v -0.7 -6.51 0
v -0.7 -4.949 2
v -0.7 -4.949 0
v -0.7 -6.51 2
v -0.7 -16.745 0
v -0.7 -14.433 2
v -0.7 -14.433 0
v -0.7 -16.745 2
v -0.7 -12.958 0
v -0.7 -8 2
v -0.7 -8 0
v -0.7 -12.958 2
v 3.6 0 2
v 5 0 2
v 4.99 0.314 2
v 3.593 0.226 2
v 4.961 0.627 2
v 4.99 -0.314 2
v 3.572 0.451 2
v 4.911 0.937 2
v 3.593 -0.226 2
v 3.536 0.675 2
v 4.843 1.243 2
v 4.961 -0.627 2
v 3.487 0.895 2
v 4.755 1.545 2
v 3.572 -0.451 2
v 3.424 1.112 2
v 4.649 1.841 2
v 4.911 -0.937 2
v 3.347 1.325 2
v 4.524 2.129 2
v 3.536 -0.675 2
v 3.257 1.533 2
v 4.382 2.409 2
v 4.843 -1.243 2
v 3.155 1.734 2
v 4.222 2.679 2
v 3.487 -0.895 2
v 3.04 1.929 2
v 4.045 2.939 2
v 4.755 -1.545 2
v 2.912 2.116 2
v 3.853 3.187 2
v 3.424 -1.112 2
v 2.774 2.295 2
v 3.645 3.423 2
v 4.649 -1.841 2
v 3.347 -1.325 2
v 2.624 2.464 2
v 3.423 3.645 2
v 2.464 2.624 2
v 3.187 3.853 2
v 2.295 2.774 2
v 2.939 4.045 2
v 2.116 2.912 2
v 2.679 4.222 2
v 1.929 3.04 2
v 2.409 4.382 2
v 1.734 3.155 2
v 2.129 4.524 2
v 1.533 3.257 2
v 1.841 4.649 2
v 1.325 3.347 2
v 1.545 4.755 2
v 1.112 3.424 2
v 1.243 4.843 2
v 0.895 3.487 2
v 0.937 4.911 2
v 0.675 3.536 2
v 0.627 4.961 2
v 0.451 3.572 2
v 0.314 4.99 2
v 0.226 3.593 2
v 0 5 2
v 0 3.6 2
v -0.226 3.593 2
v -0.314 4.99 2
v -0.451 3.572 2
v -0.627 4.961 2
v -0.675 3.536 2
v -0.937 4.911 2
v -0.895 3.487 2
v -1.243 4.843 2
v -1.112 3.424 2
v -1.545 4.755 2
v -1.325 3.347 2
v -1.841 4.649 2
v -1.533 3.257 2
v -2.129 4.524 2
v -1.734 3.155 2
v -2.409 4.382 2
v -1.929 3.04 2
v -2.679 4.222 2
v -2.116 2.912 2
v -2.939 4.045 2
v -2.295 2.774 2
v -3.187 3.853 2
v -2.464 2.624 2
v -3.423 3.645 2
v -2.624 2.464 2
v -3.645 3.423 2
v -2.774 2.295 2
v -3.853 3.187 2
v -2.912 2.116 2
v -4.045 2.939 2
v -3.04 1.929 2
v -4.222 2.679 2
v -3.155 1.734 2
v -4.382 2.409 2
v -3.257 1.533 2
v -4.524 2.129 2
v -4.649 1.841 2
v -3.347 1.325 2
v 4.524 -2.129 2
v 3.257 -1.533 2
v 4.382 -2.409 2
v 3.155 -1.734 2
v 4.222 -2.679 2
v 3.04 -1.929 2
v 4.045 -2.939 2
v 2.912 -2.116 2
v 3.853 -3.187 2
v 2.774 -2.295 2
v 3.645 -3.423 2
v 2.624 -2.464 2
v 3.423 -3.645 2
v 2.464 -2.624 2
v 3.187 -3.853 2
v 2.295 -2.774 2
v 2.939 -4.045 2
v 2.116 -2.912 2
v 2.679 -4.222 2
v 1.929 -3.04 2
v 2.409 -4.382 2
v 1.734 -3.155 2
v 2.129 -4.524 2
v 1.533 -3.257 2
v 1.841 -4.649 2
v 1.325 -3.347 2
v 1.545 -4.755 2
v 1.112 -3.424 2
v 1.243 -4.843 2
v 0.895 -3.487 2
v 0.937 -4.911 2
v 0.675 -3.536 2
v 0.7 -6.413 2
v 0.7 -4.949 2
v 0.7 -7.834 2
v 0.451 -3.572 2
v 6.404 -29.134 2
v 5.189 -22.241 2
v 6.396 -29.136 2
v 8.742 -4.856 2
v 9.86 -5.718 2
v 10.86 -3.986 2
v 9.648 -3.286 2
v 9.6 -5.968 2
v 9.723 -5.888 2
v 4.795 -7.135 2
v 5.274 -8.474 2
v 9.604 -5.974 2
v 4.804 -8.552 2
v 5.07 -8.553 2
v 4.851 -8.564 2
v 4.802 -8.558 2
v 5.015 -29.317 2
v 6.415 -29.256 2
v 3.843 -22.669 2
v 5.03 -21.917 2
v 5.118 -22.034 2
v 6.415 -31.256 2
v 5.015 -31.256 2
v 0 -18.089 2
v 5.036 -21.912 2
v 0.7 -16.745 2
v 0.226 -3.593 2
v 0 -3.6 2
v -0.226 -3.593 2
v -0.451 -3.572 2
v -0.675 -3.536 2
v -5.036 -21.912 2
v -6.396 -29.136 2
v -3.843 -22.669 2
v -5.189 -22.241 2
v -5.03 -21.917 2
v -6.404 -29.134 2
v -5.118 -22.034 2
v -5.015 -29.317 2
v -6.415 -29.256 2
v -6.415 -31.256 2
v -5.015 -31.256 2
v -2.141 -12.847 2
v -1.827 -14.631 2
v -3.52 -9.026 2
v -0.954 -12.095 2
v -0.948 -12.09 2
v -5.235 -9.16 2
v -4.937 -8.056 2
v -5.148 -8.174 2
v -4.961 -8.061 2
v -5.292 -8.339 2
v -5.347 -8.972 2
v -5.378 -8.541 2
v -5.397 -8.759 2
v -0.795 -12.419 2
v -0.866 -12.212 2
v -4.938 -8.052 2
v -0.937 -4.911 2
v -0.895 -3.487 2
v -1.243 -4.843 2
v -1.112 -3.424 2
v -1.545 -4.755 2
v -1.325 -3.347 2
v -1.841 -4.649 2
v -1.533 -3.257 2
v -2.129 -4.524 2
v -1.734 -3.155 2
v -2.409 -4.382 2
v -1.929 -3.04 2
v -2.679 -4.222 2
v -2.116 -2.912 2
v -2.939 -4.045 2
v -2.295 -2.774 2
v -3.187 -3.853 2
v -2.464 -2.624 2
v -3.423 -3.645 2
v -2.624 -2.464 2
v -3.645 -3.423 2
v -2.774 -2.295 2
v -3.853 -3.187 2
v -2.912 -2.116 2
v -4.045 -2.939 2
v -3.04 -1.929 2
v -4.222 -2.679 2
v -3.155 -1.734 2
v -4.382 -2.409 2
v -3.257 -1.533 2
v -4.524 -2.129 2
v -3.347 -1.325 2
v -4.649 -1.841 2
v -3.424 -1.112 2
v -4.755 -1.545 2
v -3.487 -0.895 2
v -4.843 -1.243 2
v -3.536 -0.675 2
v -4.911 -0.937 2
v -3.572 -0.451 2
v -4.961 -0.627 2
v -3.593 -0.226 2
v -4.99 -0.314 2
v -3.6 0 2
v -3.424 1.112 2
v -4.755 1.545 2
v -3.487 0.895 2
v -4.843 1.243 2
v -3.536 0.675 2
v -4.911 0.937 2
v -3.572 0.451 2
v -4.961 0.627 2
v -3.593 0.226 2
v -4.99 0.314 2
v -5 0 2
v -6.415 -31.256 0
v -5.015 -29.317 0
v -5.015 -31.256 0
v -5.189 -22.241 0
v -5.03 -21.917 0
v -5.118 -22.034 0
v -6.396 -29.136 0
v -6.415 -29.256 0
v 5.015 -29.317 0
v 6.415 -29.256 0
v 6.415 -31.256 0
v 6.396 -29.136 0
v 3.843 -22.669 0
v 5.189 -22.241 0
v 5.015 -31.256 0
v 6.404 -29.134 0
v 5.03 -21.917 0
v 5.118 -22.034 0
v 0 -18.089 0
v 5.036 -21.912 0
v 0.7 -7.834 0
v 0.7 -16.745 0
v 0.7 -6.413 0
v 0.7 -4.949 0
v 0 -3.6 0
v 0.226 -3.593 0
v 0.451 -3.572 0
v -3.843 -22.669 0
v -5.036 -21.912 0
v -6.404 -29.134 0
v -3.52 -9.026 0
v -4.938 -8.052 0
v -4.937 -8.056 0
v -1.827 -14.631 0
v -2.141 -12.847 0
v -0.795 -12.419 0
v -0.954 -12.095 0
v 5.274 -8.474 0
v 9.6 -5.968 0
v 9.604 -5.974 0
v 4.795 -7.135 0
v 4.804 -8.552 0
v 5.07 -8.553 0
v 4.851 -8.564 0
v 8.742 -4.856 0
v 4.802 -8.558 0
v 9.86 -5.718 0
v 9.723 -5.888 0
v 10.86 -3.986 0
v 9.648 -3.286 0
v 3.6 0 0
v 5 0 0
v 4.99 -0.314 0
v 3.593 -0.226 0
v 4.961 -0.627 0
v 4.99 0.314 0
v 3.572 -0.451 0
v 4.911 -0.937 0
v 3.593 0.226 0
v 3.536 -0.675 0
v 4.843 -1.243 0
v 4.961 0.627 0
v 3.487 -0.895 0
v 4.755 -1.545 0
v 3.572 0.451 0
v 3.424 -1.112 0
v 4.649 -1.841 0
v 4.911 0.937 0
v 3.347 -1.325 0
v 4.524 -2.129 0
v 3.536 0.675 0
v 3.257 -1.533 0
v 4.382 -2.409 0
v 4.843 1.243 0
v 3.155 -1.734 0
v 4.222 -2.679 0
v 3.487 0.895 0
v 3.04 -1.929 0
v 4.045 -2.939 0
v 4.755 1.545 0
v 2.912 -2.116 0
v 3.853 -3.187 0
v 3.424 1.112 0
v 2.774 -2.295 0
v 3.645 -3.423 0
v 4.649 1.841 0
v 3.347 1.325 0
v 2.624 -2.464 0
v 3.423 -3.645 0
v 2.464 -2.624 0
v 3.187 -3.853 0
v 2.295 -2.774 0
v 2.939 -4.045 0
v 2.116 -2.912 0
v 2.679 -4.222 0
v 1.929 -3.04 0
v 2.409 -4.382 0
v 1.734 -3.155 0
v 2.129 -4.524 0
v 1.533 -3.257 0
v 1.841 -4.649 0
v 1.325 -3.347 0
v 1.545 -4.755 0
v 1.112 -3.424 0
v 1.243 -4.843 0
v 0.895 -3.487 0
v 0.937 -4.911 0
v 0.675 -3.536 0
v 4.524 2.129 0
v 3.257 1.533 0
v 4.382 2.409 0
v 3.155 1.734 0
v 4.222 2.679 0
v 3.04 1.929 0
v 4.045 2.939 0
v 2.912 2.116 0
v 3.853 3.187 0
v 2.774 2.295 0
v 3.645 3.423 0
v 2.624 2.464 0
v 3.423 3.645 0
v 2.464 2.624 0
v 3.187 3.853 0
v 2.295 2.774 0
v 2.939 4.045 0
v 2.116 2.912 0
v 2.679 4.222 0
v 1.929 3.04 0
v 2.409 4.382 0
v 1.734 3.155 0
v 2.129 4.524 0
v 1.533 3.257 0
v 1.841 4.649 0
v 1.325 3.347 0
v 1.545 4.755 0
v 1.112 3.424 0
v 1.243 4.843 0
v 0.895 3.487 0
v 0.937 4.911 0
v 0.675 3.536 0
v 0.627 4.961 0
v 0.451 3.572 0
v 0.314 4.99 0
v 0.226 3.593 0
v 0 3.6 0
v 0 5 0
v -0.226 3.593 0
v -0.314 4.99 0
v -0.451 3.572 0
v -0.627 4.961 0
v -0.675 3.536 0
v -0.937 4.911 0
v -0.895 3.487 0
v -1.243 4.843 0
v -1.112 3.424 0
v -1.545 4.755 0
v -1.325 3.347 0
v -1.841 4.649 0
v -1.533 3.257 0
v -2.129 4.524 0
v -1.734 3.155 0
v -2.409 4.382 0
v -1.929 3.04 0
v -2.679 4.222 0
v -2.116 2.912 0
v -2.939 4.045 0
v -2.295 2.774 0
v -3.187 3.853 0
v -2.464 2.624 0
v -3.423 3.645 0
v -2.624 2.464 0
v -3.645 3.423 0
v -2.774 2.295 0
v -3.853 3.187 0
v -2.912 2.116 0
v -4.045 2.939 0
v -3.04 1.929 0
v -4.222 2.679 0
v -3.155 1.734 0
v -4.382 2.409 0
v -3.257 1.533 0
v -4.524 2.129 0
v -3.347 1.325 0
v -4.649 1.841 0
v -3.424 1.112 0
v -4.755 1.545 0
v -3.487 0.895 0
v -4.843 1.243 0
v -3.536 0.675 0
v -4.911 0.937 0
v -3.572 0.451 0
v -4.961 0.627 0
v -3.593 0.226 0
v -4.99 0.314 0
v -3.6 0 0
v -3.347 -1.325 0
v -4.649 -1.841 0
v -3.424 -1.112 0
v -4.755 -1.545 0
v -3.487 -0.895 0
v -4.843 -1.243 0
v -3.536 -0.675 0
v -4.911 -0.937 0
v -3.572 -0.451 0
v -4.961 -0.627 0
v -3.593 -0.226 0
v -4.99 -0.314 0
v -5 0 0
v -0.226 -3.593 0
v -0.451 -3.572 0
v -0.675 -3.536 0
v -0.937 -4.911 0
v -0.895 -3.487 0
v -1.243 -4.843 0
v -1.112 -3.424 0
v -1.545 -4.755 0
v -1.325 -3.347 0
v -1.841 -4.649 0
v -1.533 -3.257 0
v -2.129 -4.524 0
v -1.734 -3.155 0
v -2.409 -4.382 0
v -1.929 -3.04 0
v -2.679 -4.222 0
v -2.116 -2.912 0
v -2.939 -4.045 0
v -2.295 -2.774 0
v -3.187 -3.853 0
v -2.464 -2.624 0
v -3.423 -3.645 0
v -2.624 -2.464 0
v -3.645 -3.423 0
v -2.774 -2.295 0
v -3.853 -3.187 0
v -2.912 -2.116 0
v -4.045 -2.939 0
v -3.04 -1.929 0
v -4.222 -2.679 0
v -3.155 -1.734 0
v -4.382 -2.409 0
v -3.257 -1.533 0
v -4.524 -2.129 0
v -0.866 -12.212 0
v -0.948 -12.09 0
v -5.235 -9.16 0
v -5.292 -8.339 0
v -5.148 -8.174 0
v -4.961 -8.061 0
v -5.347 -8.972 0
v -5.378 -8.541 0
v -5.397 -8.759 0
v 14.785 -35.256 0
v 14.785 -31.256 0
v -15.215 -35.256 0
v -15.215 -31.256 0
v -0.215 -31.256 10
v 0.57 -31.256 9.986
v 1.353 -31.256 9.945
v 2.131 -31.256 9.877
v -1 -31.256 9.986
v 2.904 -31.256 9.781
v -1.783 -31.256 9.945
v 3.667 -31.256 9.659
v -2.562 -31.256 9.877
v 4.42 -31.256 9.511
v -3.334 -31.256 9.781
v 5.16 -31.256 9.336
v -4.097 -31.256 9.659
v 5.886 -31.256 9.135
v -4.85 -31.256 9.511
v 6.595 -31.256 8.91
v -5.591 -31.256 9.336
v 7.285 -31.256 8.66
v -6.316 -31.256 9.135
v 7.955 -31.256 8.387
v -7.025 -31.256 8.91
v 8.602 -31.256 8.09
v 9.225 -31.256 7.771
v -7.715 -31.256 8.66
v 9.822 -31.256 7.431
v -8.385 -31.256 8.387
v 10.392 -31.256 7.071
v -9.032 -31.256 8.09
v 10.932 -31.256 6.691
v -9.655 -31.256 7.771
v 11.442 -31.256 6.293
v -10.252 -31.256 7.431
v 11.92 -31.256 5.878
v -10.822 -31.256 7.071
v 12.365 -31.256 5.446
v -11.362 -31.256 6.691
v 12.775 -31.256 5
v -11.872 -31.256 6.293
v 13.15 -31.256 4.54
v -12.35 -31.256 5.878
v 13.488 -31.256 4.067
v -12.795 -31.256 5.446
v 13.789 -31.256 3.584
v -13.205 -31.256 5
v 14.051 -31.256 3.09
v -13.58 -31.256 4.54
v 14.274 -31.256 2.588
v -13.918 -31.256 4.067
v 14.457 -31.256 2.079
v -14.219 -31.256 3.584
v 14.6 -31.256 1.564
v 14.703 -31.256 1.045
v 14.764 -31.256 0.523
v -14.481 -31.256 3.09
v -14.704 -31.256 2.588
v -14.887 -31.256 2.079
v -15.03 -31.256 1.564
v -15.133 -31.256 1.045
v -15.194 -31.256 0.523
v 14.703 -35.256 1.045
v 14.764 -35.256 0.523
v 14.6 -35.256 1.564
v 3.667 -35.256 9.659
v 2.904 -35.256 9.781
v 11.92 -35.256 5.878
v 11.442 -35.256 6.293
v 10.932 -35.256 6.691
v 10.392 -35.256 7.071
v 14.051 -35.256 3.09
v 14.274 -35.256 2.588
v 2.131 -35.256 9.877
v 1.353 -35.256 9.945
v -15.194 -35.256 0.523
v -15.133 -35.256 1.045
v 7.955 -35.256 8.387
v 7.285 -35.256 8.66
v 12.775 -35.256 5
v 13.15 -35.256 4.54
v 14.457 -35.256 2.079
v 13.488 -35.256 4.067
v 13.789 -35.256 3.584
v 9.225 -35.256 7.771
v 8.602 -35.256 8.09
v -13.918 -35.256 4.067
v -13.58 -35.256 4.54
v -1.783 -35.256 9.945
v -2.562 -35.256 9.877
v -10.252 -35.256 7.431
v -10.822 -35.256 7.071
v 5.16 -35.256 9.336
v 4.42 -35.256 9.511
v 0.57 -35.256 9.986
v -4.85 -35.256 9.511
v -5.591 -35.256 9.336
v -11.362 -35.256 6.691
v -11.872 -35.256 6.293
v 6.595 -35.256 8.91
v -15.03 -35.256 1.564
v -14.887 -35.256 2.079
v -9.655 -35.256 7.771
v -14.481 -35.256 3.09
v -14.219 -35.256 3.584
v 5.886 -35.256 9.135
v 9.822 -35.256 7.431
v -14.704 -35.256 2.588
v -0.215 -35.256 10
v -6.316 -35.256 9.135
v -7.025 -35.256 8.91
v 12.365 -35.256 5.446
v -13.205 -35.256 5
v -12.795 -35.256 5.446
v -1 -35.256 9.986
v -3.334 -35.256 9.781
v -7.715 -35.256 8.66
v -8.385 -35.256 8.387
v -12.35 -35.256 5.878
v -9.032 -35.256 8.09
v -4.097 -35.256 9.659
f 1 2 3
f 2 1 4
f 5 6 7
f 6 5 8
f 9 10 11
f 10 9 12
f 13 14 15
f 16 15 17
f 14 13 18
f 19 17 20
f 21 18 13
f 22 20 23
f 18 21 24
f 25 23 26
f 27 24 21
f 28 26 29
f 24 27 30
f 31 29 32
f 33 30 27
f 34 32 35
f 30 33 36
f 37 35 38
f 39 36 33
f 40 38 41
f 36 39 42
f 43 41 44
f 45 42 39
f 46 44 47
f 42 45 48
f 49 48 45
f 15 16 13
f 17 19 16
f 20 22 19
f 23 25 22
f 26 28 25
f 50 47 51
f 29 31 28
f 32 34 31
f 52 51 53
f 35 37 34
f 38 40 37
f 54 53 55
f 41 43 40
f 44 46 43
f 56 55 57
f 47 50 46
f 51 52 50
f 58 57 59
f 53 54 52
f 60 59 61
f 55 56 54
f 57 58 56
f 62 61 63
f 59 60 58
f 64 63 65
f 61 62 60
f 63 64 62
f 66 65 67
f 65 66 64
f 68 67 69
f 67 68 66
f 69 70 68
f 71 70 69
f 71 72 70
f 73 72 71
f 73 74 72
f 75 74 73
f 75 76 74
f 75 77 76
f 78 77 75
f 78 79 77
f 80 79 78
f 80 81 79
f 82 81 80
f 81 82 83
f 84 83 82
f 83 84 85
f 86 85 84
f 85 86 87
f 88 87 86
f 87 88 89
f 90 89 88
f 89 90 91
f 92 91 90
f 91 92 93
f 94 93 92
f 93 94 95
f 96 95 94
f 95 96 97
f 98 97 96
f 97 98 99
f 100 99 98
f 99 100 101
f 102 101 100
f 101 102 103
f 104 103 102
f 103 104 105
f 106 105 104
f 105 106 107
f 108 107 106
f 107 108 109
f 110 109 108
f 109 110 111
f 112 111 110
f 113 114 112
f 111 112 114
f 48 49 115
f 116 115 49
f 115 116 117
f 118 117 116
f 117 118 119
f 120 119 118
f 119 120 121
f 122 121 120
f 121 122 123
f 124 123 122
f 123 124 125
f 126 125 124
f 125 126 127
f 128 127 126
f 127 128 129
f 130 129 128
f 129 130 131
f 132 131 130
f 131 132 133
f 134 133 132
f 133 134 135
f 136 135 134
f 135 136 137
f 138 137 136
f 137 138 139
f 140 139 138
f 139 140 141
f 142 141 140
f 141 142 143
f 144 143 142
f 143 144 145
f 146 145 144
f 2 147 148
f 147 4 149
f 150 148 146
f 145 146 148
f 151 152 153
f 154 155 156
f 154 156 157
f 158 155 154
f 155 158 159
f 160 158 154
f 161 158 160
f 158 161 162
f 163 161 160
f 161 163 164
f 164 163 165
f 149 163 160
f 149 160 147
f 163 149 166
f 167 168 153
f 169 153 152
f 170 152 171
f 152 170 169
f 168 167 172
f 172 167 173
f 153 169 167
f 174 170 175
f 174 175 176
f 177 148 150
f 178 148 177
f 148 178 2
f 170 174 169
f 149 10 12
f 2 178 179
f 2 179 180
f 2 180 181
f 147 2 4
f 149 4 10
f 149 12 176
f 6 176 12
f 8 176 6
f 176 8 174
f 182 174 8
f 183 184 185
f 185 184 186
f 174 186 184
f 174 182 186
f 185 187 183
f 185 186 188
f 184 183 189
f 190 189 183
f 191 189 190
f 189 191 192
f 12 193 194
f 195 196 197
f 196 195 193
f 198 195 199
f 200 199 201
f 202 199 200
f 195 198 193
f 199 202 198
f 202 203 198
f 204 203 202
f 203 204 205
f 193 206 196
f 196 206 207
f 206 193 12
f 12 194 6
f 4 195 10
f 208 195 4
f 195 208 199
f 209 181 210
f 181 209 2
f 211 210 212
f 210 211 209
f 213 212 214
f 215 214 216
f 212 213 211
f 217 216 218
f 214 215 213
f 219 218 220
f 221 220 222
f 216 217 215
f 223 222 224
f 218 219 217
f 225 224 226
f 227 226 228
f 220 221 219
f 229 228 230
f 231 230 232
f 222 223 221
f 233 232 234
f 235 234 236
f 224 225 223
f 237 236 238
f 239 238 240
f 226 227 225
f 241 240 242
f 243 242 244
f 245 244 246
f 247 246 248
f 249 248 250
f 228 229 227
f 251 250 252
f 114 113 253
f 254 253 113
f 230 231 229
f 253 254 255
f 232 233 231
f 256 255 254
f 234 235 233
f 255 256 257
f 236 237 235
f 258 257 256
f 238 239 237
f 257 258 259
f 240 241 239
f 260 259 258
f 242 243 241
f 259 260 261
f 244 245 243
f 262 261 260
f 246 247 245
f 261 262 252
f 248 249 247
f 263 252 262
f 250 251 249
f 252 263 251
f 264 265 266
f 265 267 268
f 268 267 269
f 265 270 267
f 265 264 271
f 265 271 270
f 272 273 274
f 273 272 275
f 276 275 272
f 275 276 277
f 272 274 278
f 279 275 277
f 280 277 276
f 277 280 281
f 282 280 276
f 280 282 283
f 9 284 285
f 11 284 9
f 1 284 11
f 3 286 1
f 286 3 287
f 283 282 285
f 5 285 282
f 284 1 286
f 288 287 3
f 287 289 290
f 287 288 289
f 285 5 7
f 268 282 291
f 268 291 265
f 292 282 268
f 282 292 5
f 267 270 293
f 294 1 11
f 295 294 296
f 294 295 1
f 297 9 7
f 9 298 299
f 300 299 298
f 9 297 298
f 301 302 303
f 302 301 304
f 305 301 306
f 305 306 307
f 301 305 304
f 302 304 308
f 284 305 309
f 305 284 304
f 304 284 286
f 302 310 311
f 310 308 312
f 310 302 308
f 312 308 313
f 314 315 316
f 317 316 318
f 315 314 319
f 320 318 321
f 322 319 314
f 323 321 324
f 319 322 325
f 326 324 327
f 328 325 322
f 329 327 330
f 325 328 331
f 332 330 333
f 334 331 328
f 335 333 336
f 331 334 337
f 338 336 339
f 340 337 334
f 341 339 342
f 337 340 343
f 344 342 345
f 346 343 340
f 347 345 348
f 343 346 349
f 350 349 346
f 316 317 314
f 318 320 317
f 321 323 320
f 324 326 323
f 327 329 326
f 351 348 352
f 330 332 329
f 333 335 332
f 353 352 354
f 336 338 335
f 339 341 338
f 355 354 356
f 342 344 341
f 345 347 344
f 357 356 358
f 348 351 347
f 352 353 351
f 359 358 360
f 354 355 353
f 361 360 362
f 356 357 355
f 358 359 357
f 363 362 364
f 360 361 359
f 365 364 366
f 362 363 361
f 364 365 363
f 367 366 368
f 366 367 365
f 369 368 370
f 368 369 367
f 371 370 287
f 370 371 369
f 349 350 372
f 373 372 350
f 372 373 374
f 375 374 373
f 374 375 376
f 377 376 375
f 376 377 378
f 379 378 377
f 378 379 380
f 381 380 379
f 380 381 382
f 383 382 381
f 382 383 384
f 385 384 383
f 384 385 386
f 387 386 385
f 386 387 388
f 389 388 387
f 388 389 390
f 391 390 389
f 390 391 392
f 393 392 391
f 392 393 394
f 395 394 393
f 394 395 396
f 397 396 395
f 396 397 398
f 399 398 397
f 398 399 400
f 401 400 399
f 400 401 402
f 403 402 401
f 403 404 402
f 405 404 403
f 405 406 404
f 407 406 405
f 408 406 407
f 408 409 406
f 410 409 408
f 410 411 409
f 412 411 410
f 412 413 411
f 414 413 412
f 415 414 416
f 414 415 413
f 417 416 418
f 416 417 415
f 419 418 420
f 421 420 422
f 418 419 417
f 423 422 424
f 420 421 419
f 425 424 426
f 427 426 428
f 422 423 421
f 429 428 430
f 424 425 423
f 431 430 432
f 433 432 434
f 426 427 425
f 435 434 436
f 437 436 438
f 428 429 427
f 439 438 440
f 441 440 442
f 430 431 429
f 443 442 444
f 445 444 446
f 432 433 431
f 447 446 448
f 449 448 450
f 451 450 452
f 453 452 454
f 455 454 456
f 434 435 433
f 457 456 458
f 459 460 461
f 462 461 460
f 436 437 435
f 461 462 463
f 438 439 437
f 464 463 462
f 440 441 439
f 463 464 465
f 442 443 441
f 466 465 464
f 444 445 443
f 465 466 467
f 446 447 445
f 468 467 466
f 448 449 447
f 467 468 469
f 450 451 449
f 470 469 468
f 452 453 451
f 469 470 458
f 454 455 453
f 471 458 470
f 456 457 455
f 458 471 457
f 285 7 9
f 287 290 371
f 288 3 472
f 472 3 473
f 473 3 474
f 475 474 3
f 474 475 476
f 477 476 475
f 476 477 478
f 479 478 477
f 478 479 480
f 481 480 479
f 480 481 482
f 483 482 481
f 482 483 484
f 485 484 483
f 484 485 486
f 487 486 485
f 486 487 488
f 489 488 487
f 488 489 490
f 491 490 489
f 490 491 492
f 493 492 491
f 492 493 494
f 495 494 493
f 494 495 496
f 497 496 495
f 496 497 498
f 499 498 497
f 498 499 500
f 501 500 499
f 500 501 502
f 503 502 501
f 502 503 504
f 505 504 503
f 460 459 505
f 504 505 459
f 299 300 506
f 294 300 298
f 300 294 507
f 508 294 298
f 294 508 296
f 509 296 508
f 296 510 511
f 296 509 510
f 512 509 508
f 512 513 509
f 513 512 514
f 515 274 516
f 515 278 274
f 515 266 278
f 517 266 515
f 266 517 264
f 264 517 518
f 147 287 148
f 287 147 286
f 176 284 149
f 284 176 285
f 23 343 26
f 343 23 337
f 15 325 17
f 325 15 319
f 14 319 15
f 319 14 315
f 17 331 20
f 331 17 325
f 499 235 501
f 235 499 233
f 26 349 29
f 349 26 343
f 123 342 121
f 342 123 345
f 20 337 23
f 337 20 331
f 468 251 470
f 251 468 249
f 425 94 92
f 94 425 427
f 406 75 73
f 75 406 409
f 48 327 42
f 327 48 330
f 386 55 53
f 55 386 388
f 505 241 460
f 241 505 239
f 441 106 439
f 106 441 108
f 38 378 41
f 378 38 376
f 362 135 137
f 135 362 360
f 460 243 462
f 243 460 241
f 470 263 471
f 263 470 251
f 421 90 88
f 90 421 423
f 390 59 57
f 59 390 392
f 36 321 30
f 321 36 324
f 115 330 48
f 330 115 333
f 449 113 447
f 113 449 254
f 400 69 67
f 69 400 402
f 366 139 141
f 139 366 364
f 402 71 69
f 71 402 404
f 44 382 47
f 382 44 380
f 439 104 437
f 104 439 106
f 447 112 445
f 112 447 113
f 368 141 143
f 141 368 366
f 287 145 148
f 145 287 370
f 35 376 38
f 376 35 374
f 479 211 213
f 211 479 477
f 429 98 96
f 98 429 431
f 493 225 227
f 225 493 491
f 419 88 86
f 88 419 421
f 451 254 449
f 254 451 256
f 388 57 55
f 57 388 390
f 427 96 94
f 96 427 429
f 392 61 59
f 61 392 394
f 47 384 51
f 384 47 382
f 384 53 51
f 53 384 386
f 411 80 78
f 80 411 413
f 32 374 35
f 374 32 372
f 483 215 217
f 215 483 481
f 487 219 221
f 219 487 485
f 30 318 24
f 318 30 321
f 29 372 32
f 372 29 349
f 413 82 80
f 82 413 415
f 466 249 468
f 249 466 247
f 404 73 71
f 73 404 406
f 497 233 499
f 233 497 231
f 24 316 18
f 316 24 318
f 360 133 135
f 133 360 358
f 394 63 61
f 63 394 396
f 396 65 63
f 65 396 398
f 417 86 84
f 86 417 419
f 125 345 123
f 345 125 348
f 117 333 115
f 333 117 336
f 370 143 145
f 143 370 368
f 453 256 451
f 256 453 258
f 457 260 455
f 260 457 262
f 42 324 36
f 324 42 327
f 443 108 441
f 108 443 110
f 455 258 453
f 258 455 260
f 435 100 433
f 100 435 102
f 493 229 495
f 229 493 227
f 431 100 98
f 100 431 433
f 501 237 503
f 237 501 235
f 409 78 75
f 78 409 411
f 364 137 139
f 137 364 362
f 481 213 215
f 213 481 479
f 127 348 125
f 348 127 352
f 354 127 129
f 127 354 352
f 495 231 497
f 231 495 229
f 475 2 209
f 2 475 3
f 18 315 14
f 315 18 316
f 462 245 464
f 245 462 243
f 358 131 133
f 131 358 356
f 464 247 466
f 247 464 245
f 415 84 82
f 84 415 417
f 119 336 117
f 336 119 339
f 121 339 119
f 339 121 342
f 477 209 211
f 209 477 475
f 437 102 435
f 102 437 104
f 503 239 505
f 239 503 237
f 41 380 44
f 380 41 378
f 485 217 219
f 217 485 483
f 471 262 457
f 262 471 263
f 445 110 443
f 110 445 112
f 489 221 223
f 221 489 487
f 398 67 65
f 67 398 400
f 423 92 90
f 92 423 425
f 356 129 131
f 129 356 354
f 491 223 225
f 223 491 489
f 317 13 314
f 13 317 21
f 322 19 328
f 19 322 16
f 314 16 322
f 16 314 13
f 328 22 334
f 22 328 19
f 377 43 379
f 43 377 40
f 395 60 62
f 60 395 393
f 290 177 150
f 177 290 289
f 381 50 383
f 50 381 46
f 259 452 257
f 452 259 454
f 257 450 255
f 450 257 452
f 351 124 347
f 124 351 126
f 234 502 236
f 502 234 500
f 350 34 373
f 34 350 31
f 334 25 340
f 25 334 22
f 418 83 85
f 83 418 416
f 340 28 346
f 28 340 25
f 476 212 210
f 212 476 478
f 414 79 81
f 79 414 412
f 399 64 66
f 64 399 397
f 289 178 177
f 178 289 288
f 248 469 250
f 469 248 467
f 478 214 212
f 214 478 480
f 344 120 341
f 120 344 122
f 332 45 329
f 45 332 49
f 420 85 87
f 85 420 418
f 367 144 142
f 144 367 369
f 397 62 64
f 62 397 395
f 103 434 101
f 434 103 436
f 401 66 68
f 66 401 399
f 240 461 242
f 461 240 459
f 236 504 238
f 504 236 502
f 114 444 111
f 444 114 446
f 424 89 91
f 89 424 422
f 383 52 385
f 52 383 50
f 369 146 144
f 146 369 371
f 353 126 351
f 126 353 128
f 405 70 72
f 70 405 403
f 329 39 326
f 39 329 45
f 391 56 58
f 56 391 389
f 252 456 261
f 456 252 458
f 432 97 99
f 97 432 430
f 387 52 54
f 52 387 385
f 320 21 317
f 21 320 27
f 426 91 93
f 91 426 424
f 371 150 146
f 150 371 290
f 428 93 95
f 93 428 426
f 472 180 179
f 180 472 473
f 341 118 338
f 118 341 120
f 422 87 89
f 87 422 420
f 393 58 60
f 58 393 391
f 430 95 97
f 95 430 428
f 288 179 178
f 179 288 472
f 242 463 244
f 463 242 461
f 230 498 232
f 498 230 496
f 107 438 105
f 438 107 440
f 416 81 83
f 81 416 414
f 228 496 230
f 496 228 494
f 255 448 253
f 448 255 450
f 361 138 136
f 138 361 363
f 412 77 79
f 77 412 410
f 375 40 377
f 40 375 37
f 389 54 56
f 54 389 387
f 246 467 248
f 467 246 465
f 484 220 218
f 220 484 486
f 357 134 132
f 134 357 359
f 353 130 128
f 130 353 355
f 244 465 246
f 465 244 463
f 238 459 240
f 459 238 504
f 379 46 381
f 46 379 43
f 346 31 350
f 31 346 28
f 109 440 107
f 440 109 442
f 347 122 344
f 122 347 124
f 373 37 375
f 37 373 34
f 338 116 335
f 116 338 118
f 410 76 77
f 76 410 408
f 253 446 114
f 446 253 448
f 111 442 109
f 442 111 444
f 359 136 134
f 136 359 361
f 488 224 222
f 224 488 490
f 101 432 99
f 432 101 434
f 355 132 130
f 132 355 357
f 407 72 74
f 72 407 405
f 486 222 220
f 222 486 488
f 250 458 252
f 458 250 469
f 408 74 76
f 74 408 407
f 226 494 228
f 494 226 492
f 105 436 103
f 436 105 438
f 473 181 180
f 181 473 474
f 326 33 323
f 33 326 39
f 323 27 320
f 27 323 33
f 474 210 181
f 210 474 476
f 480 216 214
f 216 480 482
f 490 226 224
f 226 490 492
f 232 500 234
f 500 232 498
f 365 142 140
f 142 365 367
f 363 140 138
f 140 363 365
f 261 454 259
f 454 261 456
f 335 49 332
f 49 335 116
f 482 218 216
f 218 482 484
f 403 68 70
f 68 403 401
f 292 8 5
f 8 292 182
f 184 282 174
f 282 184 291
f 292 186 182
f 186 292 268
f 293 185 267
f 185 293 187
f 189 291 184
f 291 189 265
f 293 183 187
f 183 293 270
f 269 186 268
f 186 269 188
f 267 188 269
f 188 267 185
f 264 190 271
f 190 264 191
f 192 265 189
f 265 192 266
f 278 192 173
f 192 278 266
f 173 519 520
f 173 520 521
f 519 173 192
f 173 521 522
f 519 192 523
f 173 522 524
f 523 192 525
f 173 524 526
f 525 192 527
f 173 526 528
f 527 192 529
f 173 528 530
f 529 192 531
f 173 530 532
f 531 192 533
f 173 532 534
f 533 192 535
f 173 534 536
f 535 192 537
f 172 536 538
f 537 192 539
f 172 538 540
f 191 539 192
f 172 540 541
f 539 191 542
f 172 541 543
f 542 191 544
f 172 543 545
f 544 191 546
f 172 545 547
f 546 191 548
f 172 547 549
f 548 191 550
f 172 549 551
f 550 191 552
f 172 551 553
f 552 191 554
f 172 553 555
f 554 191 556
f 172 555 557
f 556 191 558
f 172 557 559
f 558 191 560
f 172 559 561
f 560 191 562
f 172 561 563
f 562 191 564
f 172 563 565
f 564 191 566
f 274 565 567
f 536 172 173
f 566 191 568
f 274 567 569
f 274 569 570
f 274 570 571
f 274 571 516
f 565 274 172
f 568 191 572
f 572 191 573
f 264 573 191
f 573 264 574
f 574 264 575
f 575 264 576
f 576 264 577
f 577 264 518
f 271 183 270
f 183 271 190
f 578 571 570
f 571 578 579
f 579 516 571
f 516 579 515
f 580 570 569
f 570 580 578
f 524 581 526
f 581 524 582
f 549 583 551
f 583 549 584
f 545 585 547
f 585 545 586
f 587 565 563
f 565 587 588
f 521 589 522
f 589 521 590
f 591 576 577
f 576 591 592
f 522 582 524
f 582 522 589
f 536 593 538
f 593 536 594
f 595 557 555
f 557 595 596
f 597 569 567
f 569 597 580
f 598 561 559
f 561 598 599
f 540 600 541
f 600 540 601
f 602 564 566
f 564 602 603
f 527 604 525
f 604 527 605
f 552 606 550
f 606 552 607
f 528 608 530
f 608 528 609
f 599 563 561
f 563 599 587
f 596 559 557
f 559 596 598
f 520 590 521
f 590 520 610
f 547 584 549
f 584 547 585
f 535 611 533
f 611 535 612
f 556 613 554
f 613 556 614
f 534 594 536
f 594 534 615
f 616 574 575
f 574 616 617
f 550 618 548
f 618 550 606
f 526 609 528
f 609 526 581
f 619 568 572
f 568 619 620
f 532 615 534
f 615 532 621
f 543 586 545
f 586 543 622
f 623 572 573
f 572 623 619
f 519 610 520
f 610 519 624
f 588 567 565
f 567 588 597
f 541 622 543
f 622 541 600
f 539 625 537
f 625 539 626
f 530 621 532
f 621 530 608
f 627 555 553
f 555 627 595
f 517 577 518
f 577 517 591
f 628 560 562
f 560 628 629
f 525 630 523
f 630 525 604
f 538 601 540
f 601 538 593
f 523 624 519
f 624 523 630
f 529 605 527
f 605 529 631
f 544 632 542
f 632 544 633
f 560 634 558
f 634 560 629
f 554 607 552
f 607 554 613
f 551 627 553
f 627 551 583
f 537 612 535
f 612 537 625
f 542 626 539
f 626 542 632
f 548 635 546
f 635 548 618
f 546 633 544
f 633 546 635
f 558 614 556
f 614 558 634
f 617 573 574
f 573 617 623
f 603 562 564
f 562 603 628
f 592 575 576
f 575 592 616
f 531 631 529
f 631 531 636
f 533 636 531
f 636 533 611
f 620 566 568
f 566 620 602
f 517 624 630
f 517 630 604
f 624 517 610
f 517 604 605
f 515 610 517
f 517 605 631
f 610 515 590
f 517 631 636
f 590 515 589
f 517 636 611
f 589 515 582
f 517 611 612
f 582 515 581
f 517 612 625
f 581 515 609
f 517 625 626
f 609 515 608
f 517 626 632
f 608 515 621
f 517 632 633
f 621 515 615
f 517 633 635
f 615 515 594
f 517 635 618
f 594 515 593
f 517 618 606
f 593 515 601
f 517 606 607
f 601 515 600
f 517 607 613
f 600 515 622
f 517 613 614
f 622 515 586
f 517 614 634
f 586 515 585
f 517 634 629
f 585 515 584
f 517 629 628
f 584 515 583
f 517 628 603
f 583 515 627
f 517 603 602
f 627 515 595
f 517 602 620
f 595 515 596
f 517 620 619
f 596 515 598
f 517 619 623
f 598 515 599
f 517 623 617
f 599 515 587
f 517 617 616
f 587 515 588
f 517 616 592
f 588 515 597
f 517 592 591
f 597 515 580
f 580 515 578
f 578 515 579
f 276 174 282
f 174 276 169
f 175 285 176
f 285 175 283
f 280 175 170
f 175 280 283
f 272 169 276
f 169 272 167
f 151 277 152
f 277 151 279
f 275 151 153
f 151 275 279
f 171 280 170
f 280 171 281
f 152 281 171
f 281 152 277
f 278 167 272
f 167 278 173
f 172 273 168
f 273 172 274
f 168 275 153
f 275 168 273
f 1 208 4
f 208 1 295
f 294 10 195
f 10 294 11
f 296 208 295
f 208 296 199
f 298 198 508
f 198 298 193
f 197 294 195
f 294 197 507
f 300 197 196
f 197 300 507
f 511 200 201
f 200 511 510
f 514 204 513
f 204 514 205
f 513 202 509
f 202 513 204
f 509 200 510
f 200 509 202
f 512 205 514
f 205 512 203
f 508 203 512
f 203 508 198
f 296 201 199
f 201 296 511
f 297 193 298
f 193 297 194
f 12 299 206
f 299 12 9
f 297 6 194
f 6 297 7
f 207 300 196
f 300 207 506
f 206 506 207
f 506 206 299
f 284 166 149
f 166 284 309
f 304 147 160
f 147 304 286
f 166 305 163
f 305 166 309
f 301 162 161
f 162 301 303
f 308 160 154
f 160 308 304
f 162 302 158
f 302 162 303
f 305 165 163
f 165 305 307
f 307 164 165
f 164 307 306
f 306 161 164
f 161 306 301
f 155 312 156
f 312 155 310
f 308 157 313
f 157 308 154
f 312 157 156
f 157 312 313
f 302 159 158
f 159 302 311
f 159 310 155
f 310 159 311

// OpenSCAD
// ==================================================
// Stick Man - Customizer
// Created by Daiju Watanbe ( Daizyu ).
// 2 April 2016. 
// =================================================

// preview[view:south, tilt:top]

/* [Angle] */
upper_arm_l = -70;               // [-360:360]
lower_arm_l = 110;               // [-360:360]
hand_l = -30;               // [-360:360]
upper_arm_r = 80;               // [-360:360]
lower_arm_r = 40;               // [-360:360]
hand_r = 30;               // [-360:360]
thigh_l = -40;               // [-360:360]
shin_l = 30;               // [-360:360]
foot_l = 10;               // [-360:360]
thigh_r = 40;               // [-360:360]
shin_r = -30;               // [-360:360]
foot_r = -10;               // [-360:360]
body = 0;               // [-360:360]

/* [Base] */
base_position = 1; // [0:None,1:Left Leg,1:Right Leg,2:Left Arm,3:Right Arm] */
base_type=3;	// [1:Circle,2:Front circle,3:Back circle,4:Cube,5:Front cube,6:Back cube */
base_width = 15;
base_depth = 5;
base_height = 2;
base_rotate = 0;
base_offset_x = 5.5;
base_offset_y = 0;

/* [Basic] */
b_thickness = 2;
thickness = 1.4;

/* [Head] */
fill_head = false;
head_diameter = 10;
head_offset_x = 0;
head_offset_y = 0;

/* [Body] */
body_length = 12;

/* [Left arm] */
arm_l_offset = 2;
upper_arm_l_length = 5;
lower_arm_l_length = 5;
hand_l_length = 2;

/* [Right arm] */
arm_r_offset = 2;
upper_arm_r_length = 5;
lower_arm_r_length = 5;
hand_r_length = 2;

/* [Left Leg] */
thigh_l_length = 7;
shin_l_length = 7;
foot_l_length = 2;

/* [Right Leg] */
thigh_r_length = 7;
shin_r_length = 7;
foot_r_length = 2;

/* [resolution] */
base_fn = 120;
head_fn = 100;

module bone(length){
{
	translate([-thickness/2,0,0])
		cube(size = [thickness,length,b_thickness], center = false);
	}
	cylinder(h=b_thickness, r=thickness/2, center=false ,$fn=20);
}

module base(){
	if(base_type==0)
	{

	}
	if(base_type==1)
	{
		translate([0,0,b_thickness/2])
		rotate(90,[1,0,0])
		scale([base_width,base_depth,base_height])
		cylinder(h=base_height, r=1, center=false ,$fn=base_fn);
	}
	if(base_type==2)
	{
		translate([0,0,b_thickness])
		//translate([0,0,-base_height-b_thickness/2])
		rotate(90,[1,0,0])
		scale([base_width,base_depth*2,base_height])
		difference() 
		{
			cylinder(h=base_height, r=1, center=false ,$fn=base_fn);
			translate([-1,0 ,-1 ])
			cube([2,2 ,base_height+2 ], center = false);
		}
	}
	if(base_type==3)
	{
		translate([0,0,0])
		//translate([0,0,-base_height-b_thickness/2])
		rotate(90,[1,0,0])
		scale([base_width,base_depth*2,base_height])
		difference() 
		{
			cylinder(h=base_height, r=1, center=false ,$fn=base_fn);
			translate([-1,-2,-1])
			cube([2,2 ,base_height+2 ], center = false);
		}
	}
	if(base_type==4)
	{
		translate([0,0,b_thickness/2])
		//translate([0,0,-base_height-b_thickness/2])
		rotate(90,[1,0,0])
		scale([base_width,base_depth*2,base_height])
		difference() 
		{
			//cylinder(h=base_height, r=1, center=false ,$fn=base_fn);
			//cube([2,2 ,base_height+2 ], center = false);
			translate([-0.5,-0.5 ,0 ])
			cube([1,1 ,1 ], center = false);
		}
	}
	if(base_type==5)
	{
		translate([0,0,b_thickness])
		//translate([0,0,-base_height-b_thickness/2])
		rotate(90,[1,0,0])
		scale([base_width,base_depth*2,base_height])
		difference() 
		{
			//cylinder(h=base_height, r=1, center=false ,$fn=base_fn);
			//cube([2,2 ,base_height+2 ], center = false);
			translate([-0.5,-1.0 ,0 ])
			cube([1,1 ,1 ], center = false);
		}
	}
	if(base_type==6)
	{
		translate([0,0,0])
		//translate([0,0,-base_height-b_thickness/2])
		rotate(90,[1,0,0])
		scale([base_width,base_depth*2,base_height])
		difference() 
		{
			//cylinder(h=base_height, r=1, center=false ,$fn=base_fn);
			//cube([2,2 ,base_height+2 ], center = false);
			translate([-0.5,0 ,0 ])
			cube([1,1 ,1 ], center = false);
		}
	}
}


module branch(
	head_diameter,
	Degrees1,Length1,
	Degrees2,length2,
	Degrees3,length3,
	Degrees4,length4,
	BasePosition)
{
	rotate(Degrees1,[0,0,1])
	translate([0,Length1+head_diameter/2,0])
	rotate(Degrees2,[0,0,1])
	{
		bone(length2);

		translate([0,length2,0])
		rotate(Degrees3,[0,0,1])
		{
			bone(length3);

			translate([0,length3,0])
			rotate(Degrees4,[0,0,1])
			{
				bone(length4);

				if ( base_position == BasePosition ) 
				{
					translate([0,length4,0])
						rotate(-Degrees2-Degrees3
						-Degrees4-Degrees1+base_rotate,[0,0,1])
						translate([base_offset_x,base_offset_y,0])
						base();
						//cube([1,1,1]);
				}
			}
		}
	}
}

module headBody()
{
    	union(){
		translate([head_offset_x,head_offset_y,0])
			cylinder(h=b_thickness, r=head_diameter/2.0, center=false ,$fn=head_fn);
		rotate(body+180,[0,0,1])
			bone(body_length+head_diameter/2);	
	}
}

union()
{
	if ( fill_head ) 
	{
		headBody();
	}else{
		difference()
		{
			headBody();
			translate([head_offset_x,head_offset_y,-1])
				cylinder(h=b_thickness+2, r=(head_diameter)/2.0-thickness, center=false ,$fn=head_fn);
		}
	}

	branch(head_diameter,
		body+180,body_length,
		thigh_l,thigh_l_length,
		shin_l,shin_l_length,
		foot_l,foot_l_length,
		1);

	branch(head_diameter,
		body+180,body_length,
		thigh_r,thigh_r_length,
		shin_r,shin_r_length,
		foot_r,foot_r_length,
		2);

	branch(head_diameter,
		body+180,arm_l_offset,
		upper_arm_l,upper_arm_l_length,
		lower_arm_l,lower_arm_l_length,
		hand_l,hand_l_length,
		3);

	branch(head_diameter,
		body+180,arm_r_offset,
		upper_arm_r,upper_arm_r_length,
		lower_arm_r,lower_arm_r_length,
		hand_r,hand_r_length,
		4);
}
